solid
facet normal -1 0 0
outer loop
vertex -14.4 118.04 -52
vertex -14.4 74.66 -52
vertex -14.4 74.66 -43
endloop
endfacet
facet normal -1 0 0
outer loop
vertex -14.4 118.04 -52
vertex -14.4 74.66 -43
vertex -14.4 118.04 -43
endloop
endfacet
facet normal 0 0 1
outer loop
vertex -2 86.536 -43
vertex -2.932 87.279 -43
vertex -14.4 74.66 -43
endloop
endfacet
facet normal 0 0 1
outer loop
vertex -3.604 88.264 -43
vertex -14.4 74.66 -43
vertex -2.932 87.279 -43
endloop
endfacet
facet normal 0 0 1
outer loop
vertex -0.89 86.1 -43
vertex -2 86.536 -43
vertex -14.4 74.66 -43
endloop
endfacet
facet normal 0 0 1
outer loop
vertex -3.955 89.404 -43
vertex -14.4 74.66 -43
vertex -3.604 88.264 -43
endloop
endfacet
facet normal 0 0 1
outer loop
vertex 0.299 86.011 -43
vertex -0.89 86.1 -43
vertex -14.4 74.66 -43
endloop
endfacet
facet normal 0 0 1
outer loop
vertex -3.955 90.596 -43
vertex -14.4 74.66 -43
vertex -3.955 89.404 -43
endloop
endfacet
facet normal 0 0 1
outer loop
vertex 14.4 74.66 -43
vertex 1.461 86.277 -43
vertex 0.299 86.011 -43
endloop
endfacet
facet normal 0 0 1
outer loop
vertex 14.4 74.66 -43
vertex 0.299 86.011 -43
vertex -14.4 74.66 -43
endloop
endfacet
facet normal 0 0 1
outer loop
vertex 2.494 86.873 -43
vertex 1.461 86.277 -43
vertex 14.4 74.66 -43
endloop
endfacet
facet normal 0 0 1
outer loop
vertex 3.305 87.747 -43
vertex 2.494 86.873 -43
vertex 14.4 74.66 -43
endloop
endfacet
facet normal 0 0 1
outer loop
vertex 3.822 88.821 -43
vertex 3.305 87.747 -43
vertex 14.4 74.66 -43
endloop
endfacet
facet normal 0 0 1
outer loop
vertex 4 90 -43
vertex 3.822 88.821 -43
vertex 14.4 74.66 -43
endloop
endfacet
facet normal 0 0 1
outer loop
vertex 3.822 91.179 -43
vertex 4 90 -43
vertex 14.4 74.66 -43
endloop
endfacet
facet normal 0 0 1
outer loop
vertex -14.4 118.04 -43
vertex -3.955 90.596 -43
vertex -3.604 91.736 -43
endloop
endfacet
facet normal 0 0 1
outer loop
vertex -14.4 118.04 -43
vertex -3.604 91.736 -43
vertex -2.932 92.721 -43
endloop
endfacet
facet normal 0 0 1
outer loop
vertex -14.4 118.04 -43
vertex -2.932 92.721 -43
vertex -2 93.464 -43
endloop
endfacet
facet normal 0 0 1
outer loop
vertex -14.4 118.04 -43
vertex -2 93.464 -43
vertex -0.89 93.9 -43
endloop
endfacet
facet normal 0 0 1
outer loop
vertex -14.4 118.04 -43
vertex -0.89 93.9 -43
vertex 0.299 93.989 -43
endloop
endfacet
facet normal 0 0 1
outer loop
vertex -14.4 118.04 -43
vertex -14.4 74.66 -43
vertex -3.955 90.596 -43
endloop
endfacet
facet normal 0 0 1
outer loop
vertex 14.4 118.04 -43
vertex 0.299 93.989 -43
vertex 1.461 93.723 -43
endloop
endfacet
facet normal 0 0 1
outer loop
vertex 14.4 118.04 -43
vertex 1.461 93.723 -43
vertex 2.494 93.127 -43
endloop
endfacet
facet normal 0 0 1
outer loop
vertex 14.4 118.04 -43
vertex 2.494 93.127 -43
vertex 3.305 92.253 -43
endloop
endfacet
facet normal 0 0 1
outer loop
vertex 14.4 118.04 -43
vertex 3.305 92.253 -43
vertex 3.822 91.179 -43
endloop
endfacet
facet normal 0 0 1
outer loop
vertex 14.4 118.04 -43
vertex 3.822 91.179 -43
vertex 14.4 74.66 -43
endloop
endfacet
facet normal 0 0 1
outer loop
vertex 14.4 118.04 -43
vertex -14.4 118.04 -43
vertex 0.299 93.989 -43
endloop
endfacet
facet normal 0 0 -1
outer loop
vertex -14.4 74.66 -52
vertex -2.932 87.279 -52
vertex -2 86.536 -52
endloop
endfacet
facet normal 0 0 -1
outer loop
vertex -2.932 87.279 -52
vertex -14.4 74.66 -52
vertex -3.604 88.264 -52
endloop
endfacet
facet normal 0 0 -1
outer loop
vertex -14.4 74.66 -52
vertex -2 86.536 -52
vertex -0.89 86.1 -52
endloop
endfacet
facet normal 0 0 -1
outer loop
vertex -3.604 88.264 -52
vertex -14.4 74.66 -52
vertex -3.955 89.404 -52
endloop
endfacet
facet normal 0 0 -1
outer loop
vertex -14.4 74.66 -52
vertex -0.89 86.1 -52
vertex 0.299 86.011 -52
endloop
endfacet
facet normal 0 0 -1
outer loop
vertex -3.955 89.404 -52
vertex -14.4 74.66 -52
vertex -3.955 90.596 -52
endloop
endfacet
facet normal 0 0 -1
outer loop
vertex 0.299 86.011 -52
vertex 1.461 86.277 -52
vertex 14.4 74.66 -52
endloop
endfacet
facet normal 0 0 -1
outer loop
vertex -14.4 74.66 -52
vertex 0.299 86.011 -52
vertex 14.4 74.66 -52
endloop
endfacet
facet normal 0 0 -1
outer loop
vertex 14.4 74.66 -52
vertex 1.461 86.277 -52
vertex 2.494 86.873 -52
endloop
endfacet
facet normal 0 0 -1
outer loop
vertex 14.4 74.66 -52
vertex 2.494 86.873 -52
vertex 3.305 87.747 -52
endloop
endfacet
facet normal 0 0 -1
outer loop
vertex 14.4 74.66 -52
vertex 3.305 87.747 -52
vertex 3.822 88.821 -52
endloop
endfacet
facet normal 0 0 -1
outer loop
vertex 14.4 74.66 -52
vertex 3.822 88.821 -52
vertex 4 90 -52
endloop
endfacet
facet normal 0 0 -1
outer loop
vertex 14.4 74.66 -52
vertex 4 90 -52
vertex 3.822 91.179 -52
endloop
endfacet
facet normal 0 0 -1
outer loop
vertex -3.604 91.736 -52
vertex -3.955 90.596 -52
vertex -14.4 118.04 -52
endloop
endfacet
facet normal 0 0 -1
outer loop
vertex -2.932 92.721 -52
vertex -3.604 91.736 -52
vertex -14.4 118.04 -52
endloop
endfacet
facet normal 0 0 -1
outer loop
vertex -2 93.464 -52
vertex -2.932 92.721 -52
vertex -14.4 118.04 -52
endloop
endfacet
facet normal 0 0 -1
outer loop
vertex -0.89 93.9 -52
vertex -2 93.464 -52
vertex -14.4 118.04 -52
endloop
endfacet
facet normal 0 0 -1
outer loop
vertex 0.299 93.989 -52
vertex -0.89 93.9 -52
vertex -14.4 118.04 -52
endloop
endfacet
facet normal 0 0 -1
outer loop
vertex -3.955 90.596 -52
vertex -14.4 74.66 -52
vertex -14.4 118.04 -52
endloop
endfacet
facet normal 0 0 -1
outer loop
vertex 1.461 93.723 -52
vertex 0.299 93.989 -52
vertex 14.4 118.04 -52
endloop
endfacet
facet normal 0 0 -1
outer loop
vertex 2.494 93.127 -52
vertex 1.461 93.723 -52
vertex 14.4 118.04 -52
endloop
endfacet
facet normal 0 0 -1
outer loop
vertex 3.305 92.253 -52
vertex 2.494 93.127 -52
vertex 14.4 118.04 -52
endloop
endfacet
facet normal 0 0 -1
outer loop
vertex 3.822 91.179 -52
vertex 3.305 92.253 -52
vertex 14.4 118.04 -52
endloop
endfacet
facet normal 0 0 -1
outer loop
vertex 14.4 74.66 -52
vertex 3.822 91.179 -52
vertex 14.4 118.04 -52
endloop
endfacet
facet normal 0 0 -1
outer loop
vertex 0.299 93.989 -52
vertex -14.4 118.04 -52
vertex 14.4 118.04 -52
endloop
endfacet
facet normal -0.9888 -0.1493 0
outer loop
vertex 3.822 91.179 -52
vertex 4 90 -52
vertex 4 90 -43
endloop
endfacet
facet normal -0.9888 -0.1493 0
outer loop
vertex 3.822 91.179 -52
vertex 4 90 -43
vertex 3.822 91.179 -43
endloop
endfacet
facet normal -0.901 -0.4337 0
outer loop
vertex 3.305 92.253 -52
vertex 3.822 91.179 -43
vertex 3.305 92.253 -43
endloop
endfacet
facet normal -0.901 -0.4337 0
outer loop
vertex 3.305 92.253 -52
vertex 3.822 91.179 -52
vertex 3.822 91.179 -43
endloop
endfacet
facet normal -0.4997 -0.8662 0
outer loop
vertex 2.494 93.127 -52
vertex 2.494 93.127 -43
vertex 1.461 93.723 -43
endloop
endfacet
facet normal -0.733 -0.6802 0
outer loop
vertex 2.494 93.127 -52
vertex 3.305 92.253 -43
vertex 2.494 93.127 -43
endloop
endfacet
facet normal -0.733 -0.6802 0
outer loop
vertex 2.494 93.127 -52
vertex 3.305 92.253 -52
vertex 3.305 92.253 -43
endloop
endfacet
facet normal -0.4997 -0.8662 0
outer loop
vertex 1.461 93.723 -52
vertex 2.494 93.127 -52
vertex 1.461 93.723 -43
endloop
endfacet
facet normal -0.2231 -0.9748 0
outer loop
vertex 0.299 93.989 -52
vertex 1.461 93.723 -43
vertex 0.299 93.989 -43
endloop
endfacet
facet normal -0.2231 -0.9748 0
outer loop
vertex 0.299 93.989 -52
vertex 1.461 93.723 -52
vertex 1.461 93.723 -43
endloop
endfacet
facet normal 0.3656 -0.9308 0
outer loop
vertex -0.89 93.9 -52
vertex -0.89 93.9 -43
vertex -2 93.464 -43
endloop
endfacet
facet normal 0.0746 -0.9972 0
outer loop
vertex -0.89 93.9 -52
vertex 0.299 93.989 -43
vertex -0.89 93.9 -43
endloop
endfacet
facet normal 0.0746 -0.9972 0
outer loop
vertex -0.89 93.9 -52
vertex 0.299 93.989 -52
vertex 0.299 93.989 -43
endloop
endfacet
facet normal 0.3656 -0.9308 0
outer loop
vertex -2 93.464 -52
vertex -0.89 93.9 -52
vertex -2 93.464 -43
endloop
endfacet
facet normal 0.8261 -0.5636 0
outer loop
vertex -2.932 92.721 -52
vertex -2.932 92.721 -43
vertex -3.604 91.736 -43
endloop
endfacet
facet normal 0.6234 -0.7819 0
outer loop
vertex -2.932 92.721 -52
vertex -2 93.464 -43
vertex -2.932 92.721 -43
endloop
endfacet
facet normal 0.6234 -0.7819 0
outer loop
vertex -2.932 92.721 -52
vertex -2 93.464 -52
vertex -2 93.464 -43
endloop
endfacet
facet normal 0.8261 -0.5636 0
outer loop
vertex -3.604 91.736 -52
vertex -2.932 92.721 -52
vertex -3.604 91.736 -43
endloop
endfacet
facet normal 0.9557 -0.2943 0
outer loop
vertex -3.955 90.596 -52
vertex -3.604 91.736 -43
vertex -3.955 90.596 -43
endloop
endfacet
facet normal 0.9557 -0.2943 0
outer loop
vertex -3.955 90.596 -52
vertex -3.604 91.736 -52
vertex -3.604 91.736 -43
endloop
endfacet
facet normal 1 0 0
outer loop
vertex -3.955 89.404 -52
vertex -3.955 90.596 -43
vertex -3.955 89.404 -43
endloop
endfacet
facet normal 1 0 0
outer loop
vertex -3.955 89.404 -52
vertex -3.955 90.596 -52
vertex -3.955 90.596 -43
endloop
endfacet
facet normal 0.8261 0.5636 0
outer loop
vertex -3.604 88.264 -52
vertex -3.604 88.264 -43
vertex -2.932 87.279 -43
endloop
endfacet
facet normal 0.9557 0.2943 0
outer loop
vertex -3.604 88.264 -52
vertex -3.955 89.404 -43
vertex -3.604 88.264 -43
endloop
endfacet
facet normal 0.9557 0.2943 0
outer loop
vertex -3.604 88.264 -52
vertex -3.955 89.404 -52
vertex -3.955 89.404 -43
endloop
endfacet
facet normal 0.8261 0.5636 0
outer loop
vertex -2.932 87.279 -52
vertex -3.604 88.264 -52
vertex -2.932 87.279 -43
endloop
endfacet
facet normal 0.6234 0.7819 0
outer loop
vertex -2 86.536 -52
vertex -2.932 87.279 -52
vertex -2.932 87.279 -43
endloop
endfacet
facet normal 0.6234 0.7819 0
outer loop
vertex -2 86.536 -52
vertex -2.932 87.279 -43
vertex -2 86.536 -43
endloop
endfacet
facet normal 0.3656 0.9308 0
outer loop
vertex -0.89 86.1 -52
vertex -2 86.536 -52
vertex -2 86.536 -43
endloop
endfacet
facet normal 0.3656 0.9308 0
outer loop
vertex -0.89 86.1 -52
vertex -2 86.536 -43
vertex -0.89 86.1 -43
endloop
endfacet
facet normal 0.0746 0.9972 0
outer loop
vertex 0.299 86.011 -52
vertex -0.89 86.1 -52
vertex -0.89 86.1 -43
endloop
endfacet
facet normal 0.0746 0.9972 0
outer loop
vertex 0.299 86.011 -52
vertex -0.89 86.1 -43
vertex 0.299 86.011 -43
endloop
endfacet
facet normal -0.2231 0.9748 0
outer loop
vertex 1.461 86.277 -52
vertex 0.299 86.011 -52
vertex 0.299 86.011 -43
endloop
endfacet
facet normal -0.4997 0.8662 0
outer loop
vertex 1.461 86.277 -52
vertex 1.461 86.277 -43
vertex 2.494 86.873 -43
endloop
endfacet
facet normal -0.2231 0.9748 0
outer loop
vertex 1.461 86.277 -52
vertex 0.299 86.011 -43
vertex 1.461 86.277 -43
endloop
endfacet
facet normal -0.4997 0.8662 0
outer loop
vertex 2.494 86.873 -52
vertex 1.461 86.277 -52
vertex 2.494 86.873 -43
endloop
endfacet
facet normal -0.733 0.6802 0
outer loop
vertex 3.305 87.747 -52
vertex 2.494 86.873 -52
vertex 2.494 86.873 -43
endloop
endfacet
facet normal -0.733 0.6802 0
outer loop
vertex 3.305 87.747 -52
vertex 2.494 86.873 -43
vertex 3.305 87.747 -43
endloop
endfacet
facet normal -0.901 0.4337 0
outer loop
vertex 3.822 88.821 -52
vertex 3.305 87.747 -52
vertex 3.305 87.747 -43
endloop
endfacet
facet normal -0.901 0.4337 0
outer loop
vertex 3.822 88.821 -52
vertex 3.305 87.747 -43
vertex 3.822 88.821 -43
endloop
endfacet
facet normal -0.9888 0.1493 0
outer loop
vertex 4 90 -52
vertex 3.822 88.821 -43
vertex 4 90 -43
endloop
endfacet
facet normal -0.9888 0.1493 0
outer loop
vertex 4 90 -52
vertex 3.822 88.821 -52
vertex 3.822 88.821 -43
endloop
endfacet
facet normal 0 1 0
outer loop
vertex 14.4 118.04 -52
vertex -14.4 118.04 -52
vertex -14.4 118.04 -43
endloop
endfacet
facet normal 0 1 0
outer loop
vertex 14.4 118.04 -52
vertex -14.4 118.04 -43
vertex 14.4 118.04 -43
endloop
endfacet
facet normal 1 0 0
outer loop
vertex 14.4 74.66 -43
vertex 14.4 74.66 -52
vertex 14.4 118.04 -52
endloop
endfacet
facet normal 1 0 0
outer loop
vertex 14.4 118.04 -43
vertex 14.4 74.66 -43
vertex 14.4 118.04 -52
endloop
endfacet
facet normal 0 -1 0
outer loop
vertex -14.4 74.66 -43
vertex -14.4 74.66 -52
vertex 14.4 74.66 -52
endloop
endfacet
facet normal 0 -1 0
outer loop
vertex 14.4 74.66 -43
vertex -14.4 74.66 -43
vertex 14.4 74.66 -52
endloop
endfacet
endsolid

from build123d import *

# Parameters (mm, degrees)
CYLINDER1615_R     = 4
CYLINDER1615_DEPTH = 100
BOX641_W           = 28.8
BOX641_H           = 43.38
BOX641_DEPTH       = 9


with BuildPart() as v_lec1615:
    # Cylinder1615 → Cylinder1615 (new body)
    with BuildSketch(Plane.XY):
        Circle(CYLINDER1615_R)
    extrude(amount=CYLINDER1615_DEPTH)


with BuildPart() as cut307:
    # Box641 → Box641 (new body)
    with BuildSketch(Plane(origin=(-14.4, -15.34, 34), x_dir=(1, 0, 0), z_dir=(0, 0, 1))):
        with Locations((14.4, 21.69)):
            Rectangle(BOX641_W, BOX641_H)
    extrude(amount=BOX641_DEPTH)

    # Cut307: cut Válec1615
    add(v_lec1615.part, mode=Mode.SUBTRACT)


with BuildPart() as cut307_1:
    # Cut307 placement: moved
    add(cut307.part.moved(Location((0, 90, -86))))


solid = cut307_1.part
